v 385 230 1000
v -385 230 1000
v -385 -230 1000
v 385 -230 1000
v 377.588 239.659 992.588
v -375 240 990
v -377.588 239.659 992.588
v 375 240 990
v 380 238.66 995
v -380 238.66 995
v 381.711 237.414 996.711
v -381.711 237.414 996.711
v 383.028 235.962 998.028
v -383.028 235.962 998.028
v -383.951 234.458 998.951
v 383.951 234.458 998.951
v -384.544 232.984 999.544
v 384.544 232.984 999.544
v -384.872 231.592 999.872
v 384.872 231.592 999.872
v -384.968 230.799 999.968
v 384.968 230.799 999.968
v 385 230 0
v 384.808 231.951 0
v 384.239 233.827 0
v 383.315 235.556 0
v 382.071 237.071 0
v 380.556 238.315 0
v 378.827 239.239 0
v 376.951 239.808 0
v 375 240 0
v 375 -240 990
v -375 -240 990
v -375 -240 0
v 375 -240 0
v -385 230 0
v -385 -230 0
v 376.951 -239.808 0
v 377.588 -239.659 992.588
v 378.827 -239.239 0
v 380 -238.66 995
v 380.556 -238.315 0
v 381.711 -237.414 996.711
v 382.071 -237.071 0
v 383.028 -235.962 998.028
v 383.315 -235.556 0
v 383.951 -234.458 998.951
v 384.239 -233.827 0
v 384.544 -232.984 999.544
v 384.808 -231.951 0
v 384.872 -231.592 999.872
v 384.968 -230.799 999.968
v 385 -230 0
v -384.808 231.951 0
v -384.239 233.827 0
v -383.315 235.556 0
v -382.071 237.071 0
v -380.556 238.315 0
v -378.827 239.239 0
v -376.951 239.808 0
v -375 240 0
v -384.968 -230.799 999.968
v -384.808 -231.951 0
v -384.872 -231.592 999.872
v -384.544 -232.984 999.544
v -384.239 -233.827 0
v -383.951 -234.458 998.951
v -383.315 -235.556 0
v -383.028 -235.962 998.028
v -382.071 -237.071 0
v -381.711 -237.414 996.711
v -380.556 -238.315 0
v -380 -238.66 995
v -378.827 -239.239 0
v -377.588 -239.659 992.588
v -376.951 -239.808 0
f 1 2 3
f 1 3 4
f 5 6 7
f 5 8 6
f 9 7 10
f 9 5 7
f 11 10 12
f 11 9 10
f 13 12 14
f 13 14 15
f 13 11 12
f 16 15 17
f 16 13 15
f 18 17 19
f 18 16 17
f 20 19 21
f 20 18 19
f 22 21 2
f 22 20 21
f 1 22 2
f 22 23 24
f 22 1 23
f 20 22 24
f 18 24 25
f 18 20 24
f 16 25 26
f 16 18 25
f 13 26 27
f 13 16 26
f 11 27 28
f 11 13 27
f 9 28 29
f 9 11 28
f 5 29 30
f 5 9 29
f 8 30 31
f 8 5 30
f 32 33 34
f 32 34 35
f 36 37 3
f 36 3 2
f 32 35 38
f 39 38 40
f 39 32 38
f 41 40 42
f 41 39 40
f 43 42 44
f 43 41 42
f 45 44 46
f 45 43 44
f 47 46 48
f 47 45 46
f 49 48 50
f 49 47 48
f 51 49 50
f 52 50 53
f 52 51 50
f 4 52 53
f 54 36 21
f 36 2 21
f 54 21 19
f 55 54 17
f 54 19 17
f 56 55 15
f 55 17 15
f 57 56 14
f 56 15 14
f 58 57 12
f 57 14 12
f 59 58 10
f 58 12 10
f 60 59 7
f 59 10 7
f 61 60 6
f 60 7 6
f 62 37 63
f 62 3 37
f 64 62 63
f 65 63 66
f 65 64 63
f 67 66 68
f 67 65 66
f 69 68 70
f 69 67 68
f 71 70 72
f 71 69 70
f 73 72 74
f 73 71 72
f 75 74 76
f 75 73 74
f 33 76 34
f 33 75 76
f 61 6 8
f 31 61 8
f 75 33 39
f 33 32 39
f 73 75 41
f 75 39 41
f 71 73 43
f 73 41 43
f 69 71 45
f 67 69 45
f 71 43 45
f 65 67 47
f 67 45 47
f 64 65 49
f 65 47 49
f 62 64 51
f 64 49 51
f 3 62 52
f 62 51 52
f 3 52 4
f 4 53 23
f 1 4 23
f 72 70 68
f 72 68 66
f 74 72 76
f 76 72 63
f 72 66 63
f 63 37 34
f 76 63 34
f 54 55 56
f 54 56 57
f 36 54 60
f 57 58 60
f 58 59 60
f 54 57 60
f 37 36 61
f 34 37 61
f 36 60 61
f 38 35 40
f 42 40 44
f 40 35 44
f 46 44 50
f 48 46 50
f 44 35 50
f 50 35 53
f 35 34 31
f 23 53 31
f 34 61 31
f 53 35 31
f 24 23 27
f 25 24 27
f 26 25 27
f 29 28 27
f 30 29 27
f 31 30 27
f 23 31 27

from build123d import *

# Parameters (mm, degrees)
CROQUIS1_W              = 770
CROQUIS1_H              = 480
SALIENTE_EXTRUIR1_DEPTH = 1000
REDONDEO1_R             = 10


with BuildPart() as part:
    # Croquis1 → Saliente-Extruir1 (new body)
    with BuildSketch(Plane.XY):
        Rectangle(CROQUIS1_W, CROQUIS1_H)
    extrude(amount=SALIENTE_EXTRUIR1_DEPTH)

    # Redondeo1
    redondeo1_edges = [part.edges().sort_by_distance(p)[0] for p in [
        (0, -240, 1000),
        (0, 240, 1000),
        (385, -240, 500),
        (-385, -240, 500),
        (-385, 240, 500),
        (385, 240, 500),
    ]]
    fillet(redondeo1_edges, radius=REDONDEO1_R)


solid = part.part
